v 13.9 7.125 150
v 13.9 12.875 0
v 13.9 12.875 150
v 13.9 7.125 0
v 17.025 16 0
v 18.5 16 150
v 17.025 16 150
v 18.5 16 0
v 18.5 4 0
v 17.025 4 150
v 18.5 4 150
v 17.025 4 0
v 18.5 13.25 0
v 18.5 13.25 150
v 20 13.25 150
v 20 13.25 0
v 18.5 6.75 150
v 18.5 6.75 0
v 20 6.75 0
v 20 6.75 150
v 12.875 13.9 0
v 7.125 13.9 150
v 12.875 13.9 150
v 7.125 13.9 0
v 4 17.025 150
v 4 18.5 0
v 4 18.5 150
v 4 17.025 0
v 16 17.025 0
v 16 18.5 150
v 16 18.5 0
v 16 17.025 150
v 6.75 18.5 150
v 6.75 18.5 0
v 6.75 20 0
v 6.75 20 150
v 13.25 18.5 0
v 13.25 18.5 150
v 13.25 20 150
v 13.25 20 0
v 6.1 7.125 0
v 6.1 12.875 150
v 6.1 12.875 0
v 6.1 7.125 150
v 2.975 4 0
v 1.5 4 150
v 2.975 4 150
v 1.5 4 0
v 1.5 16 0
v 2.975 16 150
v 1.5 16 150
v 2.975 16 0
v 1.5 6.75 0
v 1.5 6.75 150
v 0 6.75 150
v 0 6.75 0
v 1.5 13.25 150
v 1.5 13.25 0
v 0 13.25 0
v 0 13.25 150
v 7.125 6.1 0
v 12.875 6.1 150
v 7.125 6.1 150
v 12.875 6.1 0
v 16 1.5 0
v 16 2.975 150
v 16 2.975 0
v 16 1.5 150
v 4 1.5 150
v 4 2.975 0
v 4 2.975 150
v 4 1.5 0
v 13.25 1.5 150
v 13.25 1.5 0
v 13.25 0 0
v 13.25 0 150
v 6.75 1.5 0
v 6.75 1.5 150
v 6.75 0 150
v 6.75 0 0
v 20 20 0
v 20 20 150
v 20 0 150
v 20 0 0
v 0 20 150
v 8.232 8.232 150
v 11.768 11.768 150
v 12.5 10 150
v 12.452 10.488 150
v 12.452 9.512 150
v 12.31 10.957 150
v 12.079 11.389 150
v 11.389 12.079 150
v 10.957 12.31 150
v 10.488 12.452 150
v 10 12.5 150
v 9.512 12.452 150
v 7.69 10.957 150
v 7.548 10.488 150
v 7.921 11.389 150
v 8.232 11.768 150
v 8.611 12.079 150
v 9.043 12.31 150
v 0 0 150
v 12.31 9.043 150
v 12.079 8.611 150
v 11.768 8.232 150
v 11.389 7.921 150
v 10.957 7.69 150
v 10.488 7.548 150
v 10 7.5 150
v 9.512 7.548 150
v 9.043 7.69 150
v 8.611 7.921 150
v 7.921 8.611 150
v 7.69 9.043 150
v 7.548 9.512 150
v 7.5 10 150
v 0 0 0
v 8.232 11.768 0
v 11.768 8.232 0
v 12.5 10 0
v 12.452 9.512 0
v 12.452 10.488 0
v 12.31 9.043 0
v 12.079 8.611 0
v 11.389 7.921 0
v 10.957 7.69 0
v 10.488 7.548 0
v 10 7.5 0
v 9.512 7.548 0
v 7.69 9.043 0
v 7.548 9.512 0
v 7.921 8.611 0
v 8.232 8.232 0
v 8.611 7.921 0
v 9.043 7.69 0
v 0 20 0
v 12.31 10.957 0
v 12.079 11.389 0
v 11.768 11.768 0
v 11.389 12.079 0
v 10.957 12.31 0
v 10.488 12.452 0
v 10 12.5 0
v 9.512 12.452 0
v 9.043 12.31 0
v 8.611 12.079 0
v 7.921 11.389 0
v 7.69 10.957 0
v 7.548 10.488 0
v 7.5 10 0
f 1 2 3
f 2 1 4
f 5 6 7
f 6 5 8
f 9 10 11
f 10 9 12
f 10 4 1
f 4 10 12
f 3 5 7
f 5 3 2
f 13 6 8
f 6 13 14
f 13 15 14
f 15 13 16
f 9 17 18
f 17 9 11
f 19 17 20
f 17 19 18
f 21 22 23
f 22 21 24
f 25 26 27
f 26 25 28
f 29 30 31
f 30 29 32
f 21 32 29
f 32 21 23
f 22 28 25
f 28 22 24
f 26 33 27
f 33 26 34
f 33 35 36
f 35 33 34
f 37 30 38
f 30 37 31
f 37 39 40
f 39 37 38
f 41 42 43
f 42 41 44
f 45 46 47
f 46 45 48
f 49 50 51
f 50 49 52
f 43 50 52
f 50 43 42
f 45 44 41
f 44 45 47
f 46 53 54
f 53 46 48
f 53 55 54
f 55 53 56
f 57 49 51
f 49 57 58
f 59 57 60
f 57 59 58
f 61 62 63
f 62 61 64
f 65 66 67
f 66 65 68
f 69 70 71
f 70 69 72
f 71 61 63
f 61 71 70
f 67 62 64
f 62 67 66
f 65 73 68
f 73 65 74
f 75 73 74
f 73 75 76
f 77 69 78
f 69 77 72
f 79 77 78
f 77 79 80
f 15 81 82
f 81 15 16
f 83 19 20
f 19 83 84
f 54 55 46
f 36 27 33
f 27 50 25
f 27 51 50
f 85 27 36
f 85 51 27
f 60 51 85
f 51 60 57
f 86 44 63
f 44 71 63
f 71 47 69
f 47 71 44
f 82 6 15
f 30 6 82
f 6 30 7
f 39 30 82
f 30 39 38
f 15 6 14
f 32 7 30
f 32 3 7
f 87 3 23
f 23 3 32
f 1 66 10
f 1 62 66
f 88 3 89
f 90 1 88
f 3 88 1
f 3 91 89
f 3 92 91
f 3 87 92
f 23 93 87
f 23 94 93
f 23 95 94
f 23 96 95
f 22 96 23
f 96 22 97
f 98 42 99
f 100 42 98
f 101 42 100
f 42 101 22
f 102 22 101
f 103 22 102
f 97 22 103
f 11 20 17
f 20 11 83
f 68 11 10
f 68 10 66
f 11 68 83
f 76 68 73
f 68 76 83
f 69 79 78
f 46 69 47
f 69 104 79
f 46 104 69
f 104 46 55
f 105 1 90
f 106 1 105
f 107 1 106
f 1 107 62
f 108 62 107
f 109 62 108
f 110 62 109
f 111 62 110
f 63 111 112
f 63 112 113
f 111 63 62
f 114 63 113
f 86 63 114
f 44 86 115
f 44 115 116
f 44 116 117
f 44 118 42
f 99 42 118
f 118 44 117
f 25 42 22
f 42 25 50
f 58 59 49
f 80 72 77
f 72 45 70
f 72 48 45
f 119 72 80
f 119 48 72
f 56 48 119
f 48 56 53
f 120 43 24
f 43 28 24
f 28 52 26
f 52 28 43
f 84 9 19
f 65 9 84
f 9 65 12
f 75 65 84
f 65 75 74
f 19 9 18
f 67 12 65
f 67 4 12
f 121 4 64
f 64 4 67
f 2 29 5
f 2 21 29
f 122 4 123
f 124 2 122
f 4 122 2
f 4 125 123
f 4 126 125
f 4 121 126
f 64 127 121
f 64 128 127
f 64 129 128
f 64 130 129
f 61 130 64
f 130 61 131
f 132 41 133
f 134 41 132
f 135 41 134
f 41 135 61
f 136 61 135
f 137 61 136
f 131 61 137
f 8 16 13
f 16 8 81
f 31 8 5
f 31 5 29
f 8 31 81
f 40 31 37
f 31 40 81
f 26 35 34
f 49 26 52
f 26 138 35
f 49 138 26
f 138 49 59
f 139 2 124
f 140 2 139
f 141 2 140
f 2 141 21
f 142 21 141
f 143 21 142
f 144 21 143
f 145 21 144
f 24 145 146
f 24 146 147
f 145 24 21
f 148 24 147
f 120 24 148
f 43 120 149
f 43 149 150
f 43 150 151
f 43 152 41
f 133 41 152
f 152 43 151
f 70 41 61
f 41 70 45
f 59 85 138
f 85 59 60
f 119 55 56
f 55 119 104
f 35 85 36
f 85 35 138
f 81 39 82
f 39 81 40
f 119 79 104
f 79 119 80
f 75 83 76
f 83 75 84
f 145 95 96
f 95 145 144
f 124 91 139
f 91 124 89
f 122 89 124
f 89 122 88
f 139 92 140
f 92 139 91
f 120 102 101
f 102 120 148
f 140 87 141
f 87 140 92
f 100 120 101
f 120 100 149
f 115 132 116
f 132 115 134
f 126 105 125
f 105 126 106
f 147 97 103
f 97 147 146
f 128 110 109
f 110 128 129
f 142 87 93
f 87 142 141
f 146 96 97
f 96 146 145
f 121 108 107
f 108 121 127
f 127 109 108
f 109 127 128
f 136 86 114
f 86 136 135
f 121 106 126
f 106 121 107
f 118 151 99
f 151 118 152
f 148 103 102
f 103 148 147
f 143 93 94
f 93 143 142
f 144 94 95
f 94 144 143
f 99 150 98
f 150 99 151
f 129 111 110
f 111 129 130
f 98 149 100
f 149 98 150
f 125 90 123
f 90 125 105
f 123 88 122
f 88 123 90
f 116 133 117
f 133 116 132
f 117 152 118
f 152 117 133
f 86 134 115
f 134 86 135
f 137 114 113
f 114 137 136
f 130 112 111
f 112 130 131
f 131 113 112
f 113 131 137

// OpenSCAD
profileLength = 150;
//printX = 150; Not implemented
//printY = 150; Not implemented
printZHeight = 150;
printTolerance = 0.25; //Change dimensions of pin and hole 0.25mm equals gab of 0.5 mm
spaceBetweenProfiles = 5;
$fa=0.5; // default minimum facet angle is now 0.5
$fs=0.5; // default minimum facet size is now 0.5 mm

if(profileLength <= printZHeight) {
	translate([10,10,profileLength/2]) profile(profileLength);
} else {
	numOfProfiles = ceil(profileLength/(printZHeight-8));
	numOfRow = ceil(sqrt(numOfProfiles));
	currentProfile = 2;
	start = 0;
	translate([start,start,0]) profileWithPin(profileLength/numOfProfiles, printTolerance);
	for(row=[0:numOfRow-1]) {
		for(col=[0:numOfRow-1]) {
			if(row*numOfRow+col < numOfProfiles-1 && row*numOfRow+col > 0) {
				translate([start+row*(20+spaceBetweenProfiles),start+col*(20+spaceBetweenProfiles),0]) profileWithHoleAndPin(profileLength/numOfProfiles, printTolerance);
			} else {
				if(row*numOfRow+col < numOfProfiles) {
					translate([start+row*(20+spaceBetweenProfiles),start+col*(20+spaceBetweenProfiles),0]) profileWithHole(profileLength/numOfProfiles, printTolerance);
					lastProfileDone = 1;
				}
			}
		}
	}
}

module hole(height, size) {
	radius = 1;
	divider = 1.6;
	union() {
		cube([size,size,height], center = true);
		translate([size/2-radius/divider,size/2-radius/divider,0]) cylinder(h=height, r=radius, center = true);
		translate([size/2-radius/divider,-size/2+radius/divider,0]) cylinder(h=height, r=radius, center = true);
		translate([-size/2+radius/divider,size/2-radius/divider,0]) cylinder(h=height, r=radius, center = true);
		translate([-size/2+radius/divider,-size/2+radius/divider,0]) cylinder(h=height, r=radius, center = true);
	}
}

module profileWithPin(length, tolerance) {
	height = 8 - tolerance - 1;
	size = 5.4 - tolerance;
	plunge = 5;
	translate([10,10,length/2]) union() {
		profile(length);
		translate([0,0,length/2+(height+plunge)/2-plunge]) cube([size,size,height+plunge], center = true);
	}
}

module profileWithHole(length, tolerance) {
	height = 8 + tolerance;
	size = 5.4 + tolerance;
	plunge = 1;
	translate([10,10,length/2]) difference() {
		profile(length);
		translate([0,0,length/2-(height+plunge)/2+plunge]) hole(height+plunge, size);
	}
}

module profileWithHoleAndPin(length, tolerance) {
	heightHole = 8 + tolerance;
	heightPin = 7 - tolerance;
	size = 5.4;
	plunge = 1;
	translate([10,10,length/2]) union() {
		difference() {
			profile(length);
			translate([0,0,-length/2+(heightHole+plunge)/2-plunge]) hole(heightHole+plunge, size+tolerance);
		}
		translate([0,0,length/2+(heightPin+plunge)/2-plunge]) cube([size-tolerance,size-tolerance,heightPin+plunge], center = true);
	}
}

module profile(length) { // generate a profile based on length
	difference() {
		// Create main body
		cube([20,20,length], center = true);
		
		// Create hole in middle
		cylinder(r=5/2, h=length+2, center = true);

		// Create groove
		grooveLength = length + 2;
		lengthOfCenterSide = 5.75;
		gabWidth = 6.5;
		gabDepth = 6.1;
		sizeOfCube = 12;
		gabFrontWallWidth = 1.5;
		sizeOfCornerCube = sqrt(pow(sizeOfCube/2, 2)*2);
		for(i = [0:90:270]) {
			rotate([0,0,i]) translate([sizeOfCube/2-gabDepth+20/2,0,0]) difference() {
				cube([sizeOfCube,sizeOfCube,grooveLength], center = true);
				translate([-sizeOfCube/2,-sizeOfCube/2-lengthOfCenterSide/2,0]) rotate([0,0,45]) cube([sizeOfCornerCube,sizeOfCornerCube,grooveLength+2], center = true);
				translate([-sizeOfCube/2,sizeOfCube/2+lengthOfCenterSide/2,0]) rotate([0,0,45]) cube([sizeOfCornerCube,sizeOfCornerCube,grooveLength+2], center = true);
				translate([gabDepth-gabFrontWallWidth,sizeOfCube/2+gabWidth/2,0]) cube([sizeOfCube,sizeOfCube,grooveLength+2], center = true);
				translate([gabDepth-gabFrontWallWidth,-sizeOfCube/2-gabWidth/2,0]) cube([sizeOfCube,sizeOfCube,grooveLength+2], center = true);
			}
		}
	}
}
//cube([20,20,length]);
